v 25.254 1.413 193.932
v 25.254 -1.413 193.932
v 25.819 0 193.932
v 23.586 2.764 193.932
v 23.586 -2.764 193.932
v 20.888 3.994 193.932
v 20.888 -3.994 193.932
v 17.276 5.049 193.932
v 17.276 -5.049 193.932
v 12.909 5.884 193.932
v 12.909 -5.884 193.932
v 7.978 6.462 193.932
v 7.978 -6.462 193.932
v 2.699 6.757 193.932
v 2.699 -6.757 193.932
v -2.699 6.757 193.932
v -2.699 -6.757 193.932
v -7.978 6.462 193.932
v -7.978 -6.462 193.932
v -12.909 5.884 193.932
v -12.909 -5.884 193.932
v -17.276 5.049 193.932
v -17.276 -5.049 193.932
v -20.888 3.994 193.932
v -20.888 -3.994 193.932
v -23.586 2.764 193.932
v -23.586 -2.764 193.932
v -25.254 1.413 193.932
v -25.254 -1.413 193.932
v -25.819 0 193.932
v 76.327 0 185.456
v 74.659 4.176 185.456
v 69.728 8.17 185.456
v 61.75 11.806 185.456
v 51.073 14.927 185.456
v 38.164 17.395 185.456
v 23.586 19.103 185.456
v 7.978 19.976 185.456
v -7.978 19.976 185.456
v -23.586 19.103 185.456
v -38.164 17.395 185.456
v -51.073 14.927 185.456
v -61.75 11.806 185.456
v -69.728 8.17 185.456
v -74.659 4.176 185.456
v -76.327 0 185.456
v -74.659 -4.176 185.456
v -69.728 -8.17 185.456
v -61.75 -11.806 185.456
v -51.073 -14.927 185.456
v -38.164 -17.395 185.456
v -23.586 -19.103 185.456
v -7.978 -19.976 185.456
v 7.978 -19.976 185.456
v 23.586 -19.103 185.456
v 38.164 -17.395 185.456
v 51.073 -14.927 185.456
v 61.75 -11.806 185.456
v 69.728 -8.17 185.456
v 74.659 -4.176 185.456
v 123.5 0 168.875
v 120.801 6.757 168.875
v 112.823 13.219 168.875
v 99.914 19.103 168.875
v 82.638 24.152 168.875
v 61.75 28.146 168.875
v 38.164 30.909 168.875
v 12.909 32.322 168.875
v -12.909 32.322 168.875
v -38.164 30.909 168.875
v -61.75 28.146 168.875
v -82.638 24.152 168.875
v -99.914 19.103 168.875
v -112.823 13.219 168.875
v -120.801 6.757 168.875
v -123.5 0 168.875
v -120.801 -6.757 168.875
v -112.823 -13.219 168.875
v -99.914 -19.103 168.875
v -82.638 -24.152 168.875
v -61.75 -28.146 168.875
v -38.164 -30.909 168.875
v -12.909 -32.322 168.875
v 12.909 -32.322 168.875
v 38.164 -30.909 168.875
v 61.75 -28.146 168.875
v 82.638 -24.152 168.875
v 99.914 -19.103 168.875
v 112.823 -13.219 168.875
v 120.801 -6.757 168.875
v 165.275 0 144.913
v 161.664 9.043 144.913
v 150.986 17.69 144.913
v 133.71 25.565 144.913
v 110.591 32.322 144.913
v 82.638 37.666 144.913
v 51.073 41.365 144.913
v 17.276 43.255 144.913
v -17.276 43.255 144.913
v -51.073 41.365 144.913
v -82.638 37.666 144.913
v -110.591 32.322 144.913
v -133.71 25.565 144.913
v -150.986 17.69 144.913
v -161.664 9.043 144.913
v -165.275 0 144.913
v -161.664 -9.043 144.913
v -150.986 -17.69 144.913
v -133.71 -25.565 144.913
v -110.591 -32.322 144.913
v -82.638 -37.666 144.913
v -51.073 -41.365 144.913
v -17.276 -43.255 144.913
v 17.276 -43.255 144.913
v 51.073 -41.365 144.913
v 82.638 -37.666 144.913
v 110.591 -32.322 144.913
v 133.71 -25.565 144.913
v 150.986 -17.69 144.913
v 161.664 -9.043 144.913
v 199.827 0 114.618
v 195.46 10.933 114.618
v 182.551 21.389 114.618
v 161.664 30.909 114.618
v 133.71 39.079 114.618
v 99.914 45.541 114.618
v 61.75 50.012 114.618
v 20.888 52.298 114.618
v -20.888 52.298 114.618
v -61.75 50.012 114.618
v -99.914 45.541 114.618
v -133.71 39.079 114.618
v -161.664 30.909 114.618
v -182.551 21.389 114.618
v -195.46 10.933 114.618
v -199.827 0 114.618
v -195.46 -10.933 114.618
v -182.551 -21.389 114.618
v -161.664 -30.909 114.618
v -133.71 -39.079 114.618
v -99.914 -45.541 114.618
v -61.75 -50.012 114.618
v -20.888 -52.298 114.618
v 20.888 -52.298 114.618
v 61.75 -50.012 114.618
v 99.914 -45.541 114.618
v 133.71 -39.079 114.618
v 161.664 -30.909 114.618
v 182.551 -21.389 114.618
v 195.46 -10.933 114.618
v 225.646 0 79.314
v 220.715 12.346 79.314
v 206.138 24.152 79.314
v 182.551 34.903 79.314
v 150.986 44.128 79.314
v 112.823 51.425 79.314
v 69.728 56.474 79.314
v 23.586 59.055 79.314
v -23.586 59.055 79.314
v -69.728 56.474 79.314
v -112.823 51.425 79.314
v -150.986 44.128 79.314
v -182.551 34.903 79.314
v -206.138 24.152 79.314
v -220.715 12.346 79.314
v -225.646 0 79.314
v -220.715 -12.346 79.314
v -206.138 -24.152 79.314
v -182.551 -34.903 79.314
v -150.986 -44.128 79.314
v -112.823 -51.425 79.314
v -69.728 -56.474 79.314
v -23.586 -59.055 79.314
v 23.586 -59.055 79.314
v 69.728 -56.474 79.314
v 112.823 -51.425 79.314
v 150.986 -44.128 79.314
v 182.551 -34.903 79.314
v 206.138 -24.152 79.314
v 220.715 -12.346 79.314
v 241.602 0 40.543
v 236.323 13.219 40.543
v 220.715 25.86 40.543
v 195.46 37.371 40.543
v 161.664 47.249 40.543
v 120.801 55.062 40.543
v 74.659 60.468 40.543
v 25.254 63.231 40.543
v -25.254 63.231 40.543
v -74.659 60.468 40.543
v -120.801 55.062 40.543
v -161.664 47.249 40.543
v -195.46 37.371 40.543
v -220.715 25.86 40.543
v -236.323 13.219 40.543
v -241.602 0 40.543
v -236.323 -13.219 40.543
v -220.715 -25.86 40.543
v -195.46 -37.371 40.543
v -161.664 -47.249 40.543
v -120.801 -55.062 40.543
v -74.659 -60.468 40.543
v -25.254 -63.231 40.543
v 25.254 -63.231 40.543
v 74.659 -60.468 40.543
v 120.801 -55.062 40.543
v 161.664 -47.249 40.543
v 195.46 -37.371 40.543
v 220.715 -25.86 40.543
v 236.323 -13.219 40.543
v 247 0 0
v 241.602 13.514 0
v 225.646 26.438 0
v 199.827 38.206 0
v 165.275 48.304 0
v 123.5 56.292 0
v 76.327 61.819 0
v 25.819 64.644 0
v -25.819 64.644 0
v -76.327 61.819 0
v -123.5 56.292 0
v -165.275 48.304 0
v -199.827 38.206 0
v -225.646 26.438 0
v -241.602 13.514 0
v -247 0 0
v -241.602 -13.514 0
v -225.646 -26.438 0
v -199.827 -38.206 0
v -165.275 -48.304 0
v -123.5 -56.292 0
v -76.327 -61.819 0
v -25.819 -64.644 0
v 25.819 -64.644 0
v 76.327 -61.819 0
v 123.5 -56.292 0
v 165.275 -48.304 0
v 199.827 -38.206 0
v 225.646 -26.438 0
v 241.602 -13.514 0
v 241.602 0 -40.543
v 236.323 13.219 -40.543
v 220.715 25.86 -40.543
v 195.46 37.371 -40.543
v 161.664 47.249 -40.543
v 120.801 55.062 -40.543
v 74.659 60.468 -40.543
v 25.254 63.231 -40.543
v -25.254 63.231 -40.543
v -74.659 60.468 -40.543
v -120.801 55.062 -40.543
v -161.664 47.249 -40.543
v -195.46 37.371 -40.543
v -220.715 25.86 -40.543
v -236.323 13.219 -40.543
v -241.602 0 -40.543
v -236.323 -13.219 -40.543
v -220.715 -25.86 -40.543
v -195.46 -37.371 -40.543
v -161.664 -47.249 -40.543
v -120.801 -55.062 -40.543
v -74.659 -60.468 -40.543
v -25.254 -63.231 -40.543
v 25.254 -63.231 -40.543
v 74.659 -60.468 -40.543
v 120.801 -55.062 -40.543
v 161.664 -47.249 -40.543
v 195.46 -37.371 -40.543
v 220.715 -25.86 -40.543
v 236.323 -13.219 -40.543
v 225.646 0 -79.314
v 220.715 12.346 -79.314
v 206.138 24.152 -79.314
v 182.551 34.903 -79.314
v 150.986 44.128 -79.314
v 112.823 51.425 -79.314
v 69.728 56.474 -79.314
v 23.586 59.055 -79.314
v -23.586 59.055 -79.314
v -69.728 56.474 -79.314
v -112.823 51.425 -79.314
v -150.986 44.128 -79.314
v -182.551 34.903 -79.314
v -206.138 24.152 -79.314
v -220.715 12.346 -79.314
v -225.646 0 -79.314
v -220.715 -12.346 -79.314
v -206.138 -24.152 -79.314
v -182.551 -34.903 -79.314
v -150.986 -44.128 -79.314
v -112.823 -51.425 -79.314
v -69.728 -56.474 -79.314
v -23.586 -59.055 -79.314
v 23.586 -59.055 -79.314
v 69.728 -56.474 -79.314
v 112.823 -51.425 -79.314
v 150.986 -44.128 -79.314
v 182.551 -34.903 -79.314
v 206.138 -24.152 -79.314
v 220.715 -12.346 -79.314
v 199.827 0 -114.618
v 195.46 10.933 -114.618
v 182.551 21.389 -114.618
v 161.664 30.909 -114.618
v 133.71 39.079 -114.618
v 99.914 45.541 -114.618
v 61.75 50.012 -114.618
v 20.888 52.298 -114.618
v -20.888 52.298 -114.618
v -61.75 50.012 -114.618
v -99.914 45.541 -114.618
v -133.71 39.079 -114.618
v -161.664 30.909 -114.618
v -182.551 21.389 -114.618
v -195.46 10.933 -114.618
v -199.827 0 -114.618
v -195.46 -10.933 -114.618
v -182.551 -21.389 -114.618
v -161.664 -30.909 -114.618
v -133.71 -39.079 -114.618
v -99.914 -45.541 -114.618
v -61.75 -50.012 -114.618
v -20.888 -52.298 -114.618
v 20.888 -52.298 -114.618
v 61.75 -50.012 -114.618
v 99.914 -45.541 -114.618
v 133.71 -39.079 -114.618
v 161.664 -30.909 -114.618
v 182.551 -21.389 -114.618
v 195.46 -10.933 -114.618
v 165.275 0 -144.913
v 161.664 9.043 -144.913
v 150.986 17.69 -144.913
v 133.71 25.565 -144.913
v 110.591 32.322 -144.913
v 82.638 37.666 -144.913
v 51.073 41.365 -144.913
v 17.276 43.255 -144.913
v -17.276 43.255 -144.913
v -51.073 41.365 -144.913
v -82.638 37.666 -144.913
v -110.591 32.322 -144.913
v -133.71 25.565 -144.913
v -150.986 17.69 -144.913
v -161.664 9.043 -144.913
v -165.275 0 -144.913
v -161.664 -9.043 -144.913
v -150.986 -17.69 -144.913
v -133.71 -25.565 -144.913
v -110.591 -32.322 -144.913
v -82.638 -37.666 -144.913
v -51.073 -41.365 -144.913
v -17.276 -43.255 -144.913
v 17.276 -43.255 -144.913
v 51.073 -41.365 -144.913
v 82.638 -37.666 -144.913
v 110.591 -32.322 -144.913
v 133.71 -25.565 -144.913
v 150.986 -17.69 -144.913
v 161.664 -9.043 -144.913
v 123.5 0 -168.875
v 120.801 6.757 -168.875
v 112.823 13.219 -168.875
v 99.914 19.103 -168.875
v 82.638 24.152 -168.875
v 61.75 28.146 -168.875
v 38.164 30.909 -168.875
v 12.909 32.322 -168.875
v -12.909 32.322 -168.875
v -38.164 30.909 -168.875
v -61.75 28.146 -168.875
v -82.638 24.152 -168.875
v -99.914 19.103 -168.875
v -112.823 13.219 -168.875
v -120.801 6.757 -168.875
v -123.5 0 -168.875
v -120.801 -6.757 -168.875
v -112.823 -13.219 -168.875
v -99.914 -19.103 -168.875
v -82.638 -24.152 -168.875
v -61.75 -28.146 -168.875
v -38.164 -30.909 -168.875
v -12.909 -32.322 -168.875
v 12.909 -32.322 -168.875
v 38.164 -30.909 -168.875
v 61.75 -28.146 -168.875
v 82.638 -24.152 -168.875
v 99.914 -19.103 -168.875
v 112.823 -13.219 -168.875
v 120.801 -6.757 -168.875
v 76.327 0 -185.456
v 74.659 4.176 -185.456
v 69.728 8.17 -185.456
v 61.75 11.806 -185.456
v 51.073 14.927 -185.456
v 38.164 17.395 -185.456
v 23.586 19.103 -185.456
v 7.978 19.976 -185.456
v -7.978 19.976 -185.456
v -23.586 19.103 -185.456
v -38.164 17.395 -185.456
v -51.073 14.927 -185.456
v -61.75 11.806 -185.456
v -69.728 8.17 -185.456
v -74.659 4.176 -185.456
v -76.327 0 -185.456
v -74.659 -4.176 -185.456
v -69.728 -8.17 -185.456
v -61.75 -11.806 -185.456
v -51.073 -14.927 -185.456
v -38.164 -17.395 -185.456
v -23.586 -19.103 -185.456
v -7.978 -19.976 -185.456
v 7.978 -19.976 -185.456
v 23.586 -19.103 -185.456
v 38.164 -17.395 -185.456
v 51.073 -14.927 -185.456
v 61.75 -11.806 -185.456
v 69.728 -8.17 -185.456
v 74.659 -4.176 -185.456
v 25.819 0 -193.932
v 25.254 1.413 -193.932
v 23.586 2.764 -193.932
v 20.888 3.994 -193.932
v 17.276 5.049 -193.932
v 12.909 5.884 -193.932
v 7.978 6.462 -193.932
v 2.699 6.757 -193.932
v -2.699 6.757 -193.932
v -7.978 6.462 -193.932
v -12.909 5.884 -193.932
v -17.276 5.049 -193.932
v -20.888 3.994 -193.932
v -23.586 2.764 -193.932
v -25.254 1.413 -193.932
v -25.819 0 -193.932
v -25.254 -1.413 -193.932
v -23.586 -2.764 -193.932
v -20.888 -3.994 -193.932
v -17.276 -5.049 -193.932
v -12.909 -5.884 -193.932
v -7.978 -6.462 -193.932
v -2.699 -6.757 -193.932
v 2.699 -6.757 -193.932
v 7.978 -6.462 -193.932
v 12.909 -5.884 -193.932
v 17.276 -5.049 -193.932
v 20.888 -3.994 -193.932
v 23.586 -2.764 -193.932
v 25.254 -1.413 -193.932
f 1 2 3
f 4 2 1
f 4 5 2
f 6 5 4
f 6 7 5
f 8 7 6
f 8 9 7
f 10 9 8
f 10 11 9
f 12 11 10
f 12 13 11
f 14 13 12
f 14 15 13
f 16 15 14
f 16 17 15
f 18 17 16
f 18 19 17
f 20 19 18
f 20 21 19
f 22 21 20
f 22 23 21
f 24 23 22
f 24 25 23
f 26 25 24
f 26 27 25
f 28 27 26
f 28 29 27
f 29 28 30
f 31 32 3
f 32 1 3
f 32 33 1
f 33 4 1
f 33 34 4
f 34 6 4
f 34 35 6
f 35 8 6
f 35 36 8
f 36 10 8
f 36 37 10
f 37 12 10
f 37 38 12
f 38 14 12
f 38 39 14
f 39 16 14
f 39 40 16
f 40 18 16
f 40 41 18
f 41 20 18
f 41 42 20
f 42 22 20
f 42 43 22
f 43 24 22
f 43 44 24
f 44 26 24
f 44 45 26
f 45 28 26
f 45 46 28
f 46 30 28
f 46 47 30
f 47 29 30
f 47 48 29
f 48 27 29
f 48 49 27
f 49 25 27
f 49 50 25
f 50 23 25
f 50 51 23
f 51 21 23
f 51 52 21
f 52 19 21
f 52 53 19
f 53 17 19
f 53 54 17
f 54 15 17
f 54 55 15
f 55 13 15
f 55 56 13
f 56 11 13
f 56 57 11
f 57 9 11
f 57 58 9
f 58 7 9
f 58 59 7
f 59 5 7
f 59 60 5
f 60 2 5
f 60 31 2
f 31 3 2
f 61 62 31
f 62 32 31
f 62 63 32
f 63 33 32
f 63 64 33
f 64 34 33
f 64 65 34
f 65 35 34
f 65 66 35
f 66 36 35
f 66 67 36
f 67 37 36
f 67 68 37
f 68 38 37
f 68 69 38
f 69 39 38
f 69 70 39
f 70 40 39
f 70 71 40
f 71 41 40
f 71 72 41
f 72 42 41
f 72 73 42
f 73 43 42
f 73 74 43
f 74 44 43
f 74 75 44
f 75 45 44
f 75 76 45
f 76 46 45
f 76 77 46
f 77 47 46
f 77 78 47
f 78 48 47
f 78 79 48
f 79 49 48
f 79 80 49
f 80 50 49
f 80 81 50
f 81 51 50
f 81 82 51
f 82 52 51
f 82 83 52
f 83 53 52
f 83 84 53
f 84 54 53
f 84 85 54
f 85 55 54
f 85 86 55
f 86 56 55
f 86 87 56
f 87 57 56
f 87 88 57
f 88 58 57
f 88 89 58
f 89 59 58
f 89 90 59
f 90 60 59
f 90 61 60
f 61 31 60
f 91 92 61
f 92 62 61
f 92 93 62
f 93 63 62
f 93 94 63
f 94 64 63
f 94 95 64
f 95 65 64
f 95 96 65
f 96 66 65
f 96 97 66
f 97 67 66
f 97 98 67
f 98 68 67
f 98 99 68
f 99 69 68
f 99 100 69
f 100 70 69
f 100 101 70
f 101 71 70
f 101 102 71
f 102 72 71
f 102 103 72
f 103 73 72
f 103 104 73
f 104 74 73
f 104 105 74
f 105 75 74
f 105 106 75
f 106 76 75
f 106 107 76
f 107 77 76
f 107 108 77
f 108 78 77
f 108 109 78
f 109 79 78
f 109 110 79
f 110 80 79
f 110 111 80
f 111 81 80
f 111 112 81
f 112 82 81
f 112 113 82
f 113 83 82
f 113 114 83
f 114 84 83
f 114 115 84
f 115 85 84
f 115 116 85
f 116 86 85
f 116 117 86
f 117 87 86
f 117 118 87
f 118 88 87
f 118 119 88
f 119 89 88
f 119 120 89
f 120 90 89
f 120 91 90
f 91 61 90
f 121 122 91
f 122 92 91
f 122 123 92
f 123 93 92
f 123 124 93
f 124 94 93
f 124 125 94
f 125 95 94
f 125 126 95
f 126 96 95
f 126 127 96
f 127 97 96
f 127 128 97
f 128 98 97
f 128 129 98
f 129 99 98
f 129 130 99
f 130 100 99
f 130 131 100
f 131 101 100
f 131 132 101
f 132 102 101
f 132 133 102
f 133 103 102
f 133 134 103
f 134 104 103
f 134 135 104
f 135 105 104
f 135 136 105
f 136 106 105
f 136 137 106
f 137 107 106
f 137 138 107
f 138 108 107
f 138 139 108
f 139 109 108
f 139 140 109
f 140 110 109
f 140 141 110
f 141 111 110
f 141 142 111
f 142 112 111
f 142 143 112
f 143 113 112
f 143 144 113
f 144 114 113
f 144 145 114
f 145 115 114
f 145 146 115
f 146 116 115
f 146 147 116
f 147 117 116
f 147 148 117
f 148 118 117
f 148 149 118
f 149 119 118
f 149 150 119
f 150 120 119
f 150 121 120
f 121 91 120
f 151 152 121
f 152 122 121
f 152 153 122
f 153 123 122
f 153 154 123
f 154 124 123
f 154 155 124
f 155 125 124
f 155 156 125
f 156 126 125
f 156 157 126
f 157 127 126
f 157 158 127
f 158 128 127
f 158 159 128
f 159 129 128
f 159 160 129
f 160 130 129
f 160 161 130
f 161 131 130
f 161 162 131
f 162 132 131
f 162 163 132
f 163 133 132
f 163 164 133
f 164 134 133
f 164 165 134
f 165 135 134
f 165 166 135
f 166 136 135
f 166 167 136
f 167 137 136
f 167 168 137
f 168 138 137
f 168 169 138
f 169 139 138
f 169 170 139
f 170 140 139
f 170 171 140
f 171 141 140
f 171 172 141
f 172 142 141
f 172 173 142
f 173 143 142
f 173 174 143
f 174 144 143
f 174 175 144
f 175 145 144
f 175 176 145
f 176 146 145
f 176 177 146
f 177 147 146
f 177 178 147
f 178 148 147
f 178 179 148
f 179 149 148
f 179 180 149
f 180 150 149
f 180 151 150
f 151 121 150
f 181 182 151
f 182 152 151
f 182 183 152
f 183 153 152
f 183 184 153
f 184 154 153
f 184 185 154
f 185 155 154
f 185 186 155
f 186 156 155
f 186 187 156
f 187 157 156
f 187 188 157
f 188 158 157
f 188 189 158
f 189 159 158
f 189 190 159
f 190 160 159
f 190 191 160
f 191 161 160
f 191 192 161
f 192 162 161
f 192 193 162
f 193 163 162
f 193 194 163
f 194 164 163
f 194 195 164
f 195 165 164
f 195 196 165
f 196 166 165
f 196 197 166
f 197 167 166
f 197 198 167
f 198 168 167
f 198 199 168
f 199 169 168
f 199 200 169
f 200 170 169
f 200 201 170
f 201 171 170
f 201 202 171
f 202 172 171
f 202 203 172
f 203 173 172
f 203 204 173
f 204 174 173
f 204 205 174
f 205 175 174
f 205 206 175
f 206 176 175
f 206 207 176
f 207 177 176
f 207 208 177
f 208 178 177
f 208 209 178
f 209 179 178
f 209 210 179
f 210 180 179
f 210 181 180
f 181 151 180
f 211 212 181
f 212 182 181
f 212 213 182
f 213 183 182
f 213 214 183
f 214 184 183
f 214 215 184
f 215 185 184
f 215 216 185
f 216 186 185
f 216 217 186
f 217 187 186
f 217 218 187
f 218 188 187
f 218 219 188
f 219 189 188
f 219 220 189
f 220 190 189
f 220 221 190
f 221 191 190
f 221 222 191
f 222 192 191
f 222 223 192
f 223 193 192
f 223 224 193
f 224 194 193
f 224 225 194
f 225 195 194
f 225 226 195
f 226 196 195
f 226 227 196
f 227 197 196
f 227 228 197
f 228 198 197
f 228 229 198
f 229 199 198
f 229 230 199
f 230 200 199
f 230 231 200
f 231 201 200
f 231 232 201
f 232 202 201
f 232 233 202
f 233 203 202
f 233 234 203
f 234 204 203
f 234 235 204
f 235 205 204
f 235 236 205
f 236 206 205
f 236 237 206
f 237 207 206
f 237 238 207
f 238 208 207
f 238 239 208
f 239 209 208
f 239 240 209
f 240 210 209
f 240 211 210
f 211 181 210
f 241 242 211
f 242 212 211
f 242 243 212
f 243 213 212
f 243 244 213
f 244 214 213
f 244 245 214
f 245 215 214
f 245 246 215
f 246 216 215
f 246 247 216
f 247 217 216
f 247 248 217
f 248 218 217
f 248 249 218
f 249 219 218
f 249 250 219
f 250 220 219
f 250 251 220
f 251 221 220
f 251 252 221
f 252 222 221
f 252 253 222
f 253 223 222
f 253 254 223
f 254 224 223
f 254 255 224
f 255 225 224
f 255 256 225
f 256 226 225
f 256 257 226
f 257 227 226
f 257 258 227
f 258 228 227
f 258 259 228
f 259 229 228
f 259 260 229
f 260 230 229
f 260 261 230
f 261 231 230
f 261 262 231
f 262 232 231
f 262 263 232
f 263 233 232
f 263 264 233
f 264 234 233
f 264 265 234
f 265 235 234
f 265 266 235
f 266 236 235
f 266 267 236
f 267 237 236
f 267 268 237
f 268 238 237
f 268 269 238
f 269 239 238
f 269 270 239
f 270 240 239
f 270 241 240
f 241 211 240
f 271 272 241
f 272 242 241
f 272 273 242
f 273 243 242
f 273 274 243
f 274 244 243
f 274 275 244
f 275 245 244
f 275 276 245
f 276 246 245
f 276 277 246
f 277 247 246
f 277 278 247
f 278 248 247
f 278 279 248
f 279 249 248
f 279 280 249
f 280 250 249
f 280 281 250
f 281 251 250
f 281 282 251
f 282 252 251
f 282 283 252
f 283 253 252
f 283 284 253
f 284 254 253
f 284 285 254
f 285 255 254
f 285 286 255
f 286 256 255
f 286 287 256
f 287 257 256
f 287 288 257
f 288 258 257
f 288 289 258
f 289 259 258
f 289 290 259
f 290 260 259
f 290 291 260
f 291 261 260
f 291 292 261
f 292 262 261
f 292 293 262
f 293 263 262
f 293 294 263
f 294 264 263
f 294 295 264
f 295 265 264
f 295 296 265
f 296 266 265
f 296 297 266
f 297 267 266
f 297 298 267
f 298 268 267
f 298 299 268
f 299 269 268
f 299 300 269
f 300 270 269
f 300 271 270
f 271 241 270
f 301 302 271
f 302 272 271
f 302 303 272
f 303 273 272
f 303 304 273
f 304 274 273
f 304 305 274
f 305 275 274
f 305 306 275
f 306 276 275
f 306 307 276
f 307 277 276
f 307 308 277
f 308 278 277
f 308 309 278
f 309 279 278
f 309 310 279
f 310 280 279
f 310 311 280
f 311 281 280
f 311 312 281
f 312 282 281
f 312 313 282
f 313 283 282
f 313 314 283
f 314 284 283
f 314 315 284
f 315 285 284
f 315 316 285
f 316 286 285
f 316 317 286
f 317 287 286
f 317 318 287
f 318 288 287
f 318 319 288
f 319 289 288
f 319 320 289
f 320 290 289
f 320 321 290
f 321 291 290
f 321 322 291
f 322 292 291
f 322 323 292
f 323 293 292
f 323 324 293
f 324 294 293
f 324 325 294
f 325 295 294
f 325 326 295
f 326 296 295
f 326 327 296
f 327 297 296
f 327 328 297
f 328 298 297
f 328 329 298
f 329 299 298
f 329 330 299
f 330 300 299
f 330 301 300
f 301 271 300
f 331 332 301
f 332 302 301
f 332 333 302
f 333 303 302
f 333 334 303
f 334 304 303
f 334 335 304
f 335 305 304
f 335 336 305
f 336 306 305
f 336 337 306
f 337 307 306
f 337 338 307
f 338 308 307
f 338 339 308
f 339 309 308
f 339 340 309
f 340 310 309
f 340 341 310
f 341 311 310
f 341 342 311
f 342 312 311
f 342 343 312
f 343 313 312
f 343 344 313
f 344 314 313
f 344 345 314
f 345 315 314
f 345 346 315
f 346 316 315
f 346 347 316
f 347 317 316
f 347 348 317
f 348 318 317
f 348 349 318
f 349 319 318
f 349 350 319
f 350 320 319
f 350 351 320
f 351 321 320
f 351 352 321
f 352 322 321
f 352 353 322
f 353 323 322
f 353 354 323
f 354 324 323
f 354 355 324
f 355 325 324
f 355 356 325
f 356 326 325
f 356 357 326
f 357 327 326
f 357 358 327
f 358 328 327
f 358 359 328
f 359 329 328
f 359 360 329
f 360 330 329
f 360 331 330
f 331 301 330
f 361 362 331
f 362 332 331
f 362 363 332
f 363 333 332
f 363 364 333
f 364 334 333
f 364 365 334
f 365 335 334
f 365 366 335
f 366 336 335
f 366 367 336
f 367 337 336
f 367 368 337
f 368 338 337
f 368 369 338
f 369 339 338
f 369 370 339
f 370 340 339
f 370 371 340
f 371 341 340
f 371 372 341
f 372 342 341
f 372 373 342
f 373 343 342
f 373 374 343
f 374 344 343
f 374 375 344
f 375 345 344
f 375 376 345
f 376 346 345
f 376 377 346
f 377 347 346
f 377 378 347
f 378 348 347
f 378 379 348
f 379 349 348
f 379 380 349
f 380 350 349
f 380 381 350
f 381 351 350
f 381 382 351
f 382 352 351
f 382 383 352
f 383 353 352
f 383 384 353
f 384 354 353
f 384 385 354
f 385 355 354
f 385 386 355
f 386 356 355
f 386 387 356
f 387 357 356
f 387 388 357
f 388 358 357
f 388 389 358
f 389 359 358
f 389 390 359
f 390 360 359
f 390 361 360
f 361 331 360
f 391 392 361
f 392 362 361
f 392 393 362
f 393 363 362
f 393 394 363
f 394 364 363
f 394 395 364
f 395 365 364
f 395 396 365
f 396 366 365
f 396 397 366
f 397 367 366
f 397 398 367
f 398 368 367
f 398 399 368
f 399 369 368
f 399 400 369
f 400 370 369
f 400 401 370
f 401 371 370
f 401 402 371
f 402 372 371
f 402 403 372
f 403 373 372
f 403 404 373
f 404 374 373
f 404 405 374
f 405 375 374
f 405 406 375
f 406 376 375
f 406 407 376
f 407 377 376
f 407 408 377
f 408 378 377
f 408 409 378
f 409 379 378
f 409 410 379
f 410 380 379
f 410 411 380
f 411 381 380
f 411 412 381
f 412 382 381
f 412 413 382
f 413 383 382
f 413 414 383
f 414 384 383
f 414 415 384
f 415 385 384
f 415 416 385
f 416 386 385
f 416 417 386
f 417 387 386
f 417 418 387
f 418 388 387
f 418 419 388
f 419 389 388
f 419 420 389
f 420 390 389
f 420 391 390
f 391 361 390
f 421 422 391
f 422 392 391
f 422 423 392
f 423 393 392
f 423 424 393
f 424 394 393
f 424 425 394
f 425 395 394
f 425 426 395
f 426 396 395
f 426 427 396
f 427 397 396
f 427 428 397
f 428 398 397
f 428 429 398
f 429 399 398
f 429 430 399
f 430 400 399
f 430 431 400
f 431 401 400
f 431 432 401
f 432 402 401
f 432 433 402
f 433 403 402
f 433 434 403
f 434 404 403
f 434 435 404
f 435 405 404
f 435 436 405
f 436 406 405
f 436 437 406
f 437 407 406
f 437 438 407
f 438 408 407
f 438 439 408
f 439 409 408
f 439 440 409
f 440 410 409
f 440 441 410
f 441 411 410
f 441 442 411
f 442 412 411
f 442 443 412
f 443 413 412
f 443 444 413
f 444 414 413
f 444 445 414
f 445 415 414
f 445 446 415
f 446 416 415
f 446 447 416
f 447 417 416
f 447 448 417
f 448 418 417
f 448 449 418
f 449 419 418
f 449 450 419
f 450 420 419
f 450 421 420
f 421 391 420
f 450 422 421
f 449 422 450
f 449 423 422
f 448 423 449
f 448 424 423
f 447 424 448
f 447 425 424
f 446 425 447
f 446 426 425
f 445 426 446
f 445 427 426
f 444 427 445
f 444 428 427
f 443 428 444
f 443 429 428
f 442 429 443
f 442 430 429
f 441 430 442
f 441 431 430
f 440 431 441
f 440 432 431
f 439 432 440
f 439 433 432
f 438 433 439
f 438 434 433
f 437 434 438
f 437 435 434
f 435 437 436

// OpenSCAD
// Generated by SolidPython 1.0.1 on 2020-07-29 00:46:53


scale(v = [19, 5, 15]) {
	sphere(r = 13);
}
/***********************************************
*********      SolidPython code:      **********
************************************************
 
# import packages: SolidPython
from solid import *
from solid.utils import *
from itertools import chain, combinations, permutations


class Resize:

    def __init__(self, scad_file):
        self.scad_file = scad_file
        #self.scad_file = import_scad(scad_file)
        # cone/cylinder param:
        self.r1 = 0
        self.r2 = 0
        self.h = 0
        # rectangular prism param:
        self.w = 0
        self.l = 0
        # ellipse param:
        self.r = 0

    # import OpenScad code (file name corresponds to shape)


    # classify shape + parameters
    def assign(self, param1, param2, param3):
        if self.scad_file == 'cone.scad':
            self.r1 = param1
            self.r2 = param2
            self.h = param3
        elif self.scad_file == 'cylinder.scad':
            self.r1 = param1
            self.r2 = param2
            self.h = param3
        elif self.scad_file == 'rectangularPrism.scad':
            self.h = param1
            self.l = param2
            self.w = param3
        else:
            self.r = param1
            self.h = param2

    # resize parameters
    def iterate(self):
        x = range(3, 20, 2)
        i = 1
        if self.scad_file == 'cone.scad':
            tempList = list(permutations(x, 2))
            for temp in tempList:
                param1 = temp[0]
                param2 = temp[1]
                filepath = 'produced_scad_files/' + 'cone' + str(param1) + '_' + str(param2) + '_' + '.scad'
                scad_render_to_file(cylinder(h=param1, r1=param2, r2=0), filepath)

        elif self.scad_file == 'cylinder.scad':
            tempList = list(permutations(x, 3))
            for temp in tempList:
                param1 = temp[0]
                param2 = temp[1]
                filepath = 'produced_scad_files/' + 'cylinder' + str(param1) + '_' + str(param2) + '_' + '.scad'
                scad_render_to_file(cylinder(h=param1, r1=param2, r2=param2), filepath)

        elif self.scad_file == 'rectangularPrism.scad':
            tempList = list(permutations(x, 3))
            for temp in tempList:
                param1 = temp[0]
                param2 = temp[1]
                param3 = temp[2]
                filepath = 'produced_scad_files/' + 'rectangularPrism' + str(param1) + '_' + str(param2) + '_' + str(
                    param3) + '.scad'
                scad_render_to_file(cube(size=(param1, param2, param3)), filepath)

        elif self.scad_file == 'ellipse.scad':
            tempList = list(permutations(x, 4))
            for temp in tempList:
                param1 = temp[0]
                param2 = temp[1]
                param3 = temp[2]
                param4 = temp[3]
                filepath = 'produced_scad_files/' + 'ellipse' + str(param1) + '_' + str(param2) + '_' + str(param3) + '_' + str(param4) + '.scad'
                scad_render_to_file(scale([param1, param2, param3])(sphere(r=param4)), filepath)

    def render_to_scadfile(self):
        scad_render_to_file(scad, 'example.scad') 
 
************************************************/
